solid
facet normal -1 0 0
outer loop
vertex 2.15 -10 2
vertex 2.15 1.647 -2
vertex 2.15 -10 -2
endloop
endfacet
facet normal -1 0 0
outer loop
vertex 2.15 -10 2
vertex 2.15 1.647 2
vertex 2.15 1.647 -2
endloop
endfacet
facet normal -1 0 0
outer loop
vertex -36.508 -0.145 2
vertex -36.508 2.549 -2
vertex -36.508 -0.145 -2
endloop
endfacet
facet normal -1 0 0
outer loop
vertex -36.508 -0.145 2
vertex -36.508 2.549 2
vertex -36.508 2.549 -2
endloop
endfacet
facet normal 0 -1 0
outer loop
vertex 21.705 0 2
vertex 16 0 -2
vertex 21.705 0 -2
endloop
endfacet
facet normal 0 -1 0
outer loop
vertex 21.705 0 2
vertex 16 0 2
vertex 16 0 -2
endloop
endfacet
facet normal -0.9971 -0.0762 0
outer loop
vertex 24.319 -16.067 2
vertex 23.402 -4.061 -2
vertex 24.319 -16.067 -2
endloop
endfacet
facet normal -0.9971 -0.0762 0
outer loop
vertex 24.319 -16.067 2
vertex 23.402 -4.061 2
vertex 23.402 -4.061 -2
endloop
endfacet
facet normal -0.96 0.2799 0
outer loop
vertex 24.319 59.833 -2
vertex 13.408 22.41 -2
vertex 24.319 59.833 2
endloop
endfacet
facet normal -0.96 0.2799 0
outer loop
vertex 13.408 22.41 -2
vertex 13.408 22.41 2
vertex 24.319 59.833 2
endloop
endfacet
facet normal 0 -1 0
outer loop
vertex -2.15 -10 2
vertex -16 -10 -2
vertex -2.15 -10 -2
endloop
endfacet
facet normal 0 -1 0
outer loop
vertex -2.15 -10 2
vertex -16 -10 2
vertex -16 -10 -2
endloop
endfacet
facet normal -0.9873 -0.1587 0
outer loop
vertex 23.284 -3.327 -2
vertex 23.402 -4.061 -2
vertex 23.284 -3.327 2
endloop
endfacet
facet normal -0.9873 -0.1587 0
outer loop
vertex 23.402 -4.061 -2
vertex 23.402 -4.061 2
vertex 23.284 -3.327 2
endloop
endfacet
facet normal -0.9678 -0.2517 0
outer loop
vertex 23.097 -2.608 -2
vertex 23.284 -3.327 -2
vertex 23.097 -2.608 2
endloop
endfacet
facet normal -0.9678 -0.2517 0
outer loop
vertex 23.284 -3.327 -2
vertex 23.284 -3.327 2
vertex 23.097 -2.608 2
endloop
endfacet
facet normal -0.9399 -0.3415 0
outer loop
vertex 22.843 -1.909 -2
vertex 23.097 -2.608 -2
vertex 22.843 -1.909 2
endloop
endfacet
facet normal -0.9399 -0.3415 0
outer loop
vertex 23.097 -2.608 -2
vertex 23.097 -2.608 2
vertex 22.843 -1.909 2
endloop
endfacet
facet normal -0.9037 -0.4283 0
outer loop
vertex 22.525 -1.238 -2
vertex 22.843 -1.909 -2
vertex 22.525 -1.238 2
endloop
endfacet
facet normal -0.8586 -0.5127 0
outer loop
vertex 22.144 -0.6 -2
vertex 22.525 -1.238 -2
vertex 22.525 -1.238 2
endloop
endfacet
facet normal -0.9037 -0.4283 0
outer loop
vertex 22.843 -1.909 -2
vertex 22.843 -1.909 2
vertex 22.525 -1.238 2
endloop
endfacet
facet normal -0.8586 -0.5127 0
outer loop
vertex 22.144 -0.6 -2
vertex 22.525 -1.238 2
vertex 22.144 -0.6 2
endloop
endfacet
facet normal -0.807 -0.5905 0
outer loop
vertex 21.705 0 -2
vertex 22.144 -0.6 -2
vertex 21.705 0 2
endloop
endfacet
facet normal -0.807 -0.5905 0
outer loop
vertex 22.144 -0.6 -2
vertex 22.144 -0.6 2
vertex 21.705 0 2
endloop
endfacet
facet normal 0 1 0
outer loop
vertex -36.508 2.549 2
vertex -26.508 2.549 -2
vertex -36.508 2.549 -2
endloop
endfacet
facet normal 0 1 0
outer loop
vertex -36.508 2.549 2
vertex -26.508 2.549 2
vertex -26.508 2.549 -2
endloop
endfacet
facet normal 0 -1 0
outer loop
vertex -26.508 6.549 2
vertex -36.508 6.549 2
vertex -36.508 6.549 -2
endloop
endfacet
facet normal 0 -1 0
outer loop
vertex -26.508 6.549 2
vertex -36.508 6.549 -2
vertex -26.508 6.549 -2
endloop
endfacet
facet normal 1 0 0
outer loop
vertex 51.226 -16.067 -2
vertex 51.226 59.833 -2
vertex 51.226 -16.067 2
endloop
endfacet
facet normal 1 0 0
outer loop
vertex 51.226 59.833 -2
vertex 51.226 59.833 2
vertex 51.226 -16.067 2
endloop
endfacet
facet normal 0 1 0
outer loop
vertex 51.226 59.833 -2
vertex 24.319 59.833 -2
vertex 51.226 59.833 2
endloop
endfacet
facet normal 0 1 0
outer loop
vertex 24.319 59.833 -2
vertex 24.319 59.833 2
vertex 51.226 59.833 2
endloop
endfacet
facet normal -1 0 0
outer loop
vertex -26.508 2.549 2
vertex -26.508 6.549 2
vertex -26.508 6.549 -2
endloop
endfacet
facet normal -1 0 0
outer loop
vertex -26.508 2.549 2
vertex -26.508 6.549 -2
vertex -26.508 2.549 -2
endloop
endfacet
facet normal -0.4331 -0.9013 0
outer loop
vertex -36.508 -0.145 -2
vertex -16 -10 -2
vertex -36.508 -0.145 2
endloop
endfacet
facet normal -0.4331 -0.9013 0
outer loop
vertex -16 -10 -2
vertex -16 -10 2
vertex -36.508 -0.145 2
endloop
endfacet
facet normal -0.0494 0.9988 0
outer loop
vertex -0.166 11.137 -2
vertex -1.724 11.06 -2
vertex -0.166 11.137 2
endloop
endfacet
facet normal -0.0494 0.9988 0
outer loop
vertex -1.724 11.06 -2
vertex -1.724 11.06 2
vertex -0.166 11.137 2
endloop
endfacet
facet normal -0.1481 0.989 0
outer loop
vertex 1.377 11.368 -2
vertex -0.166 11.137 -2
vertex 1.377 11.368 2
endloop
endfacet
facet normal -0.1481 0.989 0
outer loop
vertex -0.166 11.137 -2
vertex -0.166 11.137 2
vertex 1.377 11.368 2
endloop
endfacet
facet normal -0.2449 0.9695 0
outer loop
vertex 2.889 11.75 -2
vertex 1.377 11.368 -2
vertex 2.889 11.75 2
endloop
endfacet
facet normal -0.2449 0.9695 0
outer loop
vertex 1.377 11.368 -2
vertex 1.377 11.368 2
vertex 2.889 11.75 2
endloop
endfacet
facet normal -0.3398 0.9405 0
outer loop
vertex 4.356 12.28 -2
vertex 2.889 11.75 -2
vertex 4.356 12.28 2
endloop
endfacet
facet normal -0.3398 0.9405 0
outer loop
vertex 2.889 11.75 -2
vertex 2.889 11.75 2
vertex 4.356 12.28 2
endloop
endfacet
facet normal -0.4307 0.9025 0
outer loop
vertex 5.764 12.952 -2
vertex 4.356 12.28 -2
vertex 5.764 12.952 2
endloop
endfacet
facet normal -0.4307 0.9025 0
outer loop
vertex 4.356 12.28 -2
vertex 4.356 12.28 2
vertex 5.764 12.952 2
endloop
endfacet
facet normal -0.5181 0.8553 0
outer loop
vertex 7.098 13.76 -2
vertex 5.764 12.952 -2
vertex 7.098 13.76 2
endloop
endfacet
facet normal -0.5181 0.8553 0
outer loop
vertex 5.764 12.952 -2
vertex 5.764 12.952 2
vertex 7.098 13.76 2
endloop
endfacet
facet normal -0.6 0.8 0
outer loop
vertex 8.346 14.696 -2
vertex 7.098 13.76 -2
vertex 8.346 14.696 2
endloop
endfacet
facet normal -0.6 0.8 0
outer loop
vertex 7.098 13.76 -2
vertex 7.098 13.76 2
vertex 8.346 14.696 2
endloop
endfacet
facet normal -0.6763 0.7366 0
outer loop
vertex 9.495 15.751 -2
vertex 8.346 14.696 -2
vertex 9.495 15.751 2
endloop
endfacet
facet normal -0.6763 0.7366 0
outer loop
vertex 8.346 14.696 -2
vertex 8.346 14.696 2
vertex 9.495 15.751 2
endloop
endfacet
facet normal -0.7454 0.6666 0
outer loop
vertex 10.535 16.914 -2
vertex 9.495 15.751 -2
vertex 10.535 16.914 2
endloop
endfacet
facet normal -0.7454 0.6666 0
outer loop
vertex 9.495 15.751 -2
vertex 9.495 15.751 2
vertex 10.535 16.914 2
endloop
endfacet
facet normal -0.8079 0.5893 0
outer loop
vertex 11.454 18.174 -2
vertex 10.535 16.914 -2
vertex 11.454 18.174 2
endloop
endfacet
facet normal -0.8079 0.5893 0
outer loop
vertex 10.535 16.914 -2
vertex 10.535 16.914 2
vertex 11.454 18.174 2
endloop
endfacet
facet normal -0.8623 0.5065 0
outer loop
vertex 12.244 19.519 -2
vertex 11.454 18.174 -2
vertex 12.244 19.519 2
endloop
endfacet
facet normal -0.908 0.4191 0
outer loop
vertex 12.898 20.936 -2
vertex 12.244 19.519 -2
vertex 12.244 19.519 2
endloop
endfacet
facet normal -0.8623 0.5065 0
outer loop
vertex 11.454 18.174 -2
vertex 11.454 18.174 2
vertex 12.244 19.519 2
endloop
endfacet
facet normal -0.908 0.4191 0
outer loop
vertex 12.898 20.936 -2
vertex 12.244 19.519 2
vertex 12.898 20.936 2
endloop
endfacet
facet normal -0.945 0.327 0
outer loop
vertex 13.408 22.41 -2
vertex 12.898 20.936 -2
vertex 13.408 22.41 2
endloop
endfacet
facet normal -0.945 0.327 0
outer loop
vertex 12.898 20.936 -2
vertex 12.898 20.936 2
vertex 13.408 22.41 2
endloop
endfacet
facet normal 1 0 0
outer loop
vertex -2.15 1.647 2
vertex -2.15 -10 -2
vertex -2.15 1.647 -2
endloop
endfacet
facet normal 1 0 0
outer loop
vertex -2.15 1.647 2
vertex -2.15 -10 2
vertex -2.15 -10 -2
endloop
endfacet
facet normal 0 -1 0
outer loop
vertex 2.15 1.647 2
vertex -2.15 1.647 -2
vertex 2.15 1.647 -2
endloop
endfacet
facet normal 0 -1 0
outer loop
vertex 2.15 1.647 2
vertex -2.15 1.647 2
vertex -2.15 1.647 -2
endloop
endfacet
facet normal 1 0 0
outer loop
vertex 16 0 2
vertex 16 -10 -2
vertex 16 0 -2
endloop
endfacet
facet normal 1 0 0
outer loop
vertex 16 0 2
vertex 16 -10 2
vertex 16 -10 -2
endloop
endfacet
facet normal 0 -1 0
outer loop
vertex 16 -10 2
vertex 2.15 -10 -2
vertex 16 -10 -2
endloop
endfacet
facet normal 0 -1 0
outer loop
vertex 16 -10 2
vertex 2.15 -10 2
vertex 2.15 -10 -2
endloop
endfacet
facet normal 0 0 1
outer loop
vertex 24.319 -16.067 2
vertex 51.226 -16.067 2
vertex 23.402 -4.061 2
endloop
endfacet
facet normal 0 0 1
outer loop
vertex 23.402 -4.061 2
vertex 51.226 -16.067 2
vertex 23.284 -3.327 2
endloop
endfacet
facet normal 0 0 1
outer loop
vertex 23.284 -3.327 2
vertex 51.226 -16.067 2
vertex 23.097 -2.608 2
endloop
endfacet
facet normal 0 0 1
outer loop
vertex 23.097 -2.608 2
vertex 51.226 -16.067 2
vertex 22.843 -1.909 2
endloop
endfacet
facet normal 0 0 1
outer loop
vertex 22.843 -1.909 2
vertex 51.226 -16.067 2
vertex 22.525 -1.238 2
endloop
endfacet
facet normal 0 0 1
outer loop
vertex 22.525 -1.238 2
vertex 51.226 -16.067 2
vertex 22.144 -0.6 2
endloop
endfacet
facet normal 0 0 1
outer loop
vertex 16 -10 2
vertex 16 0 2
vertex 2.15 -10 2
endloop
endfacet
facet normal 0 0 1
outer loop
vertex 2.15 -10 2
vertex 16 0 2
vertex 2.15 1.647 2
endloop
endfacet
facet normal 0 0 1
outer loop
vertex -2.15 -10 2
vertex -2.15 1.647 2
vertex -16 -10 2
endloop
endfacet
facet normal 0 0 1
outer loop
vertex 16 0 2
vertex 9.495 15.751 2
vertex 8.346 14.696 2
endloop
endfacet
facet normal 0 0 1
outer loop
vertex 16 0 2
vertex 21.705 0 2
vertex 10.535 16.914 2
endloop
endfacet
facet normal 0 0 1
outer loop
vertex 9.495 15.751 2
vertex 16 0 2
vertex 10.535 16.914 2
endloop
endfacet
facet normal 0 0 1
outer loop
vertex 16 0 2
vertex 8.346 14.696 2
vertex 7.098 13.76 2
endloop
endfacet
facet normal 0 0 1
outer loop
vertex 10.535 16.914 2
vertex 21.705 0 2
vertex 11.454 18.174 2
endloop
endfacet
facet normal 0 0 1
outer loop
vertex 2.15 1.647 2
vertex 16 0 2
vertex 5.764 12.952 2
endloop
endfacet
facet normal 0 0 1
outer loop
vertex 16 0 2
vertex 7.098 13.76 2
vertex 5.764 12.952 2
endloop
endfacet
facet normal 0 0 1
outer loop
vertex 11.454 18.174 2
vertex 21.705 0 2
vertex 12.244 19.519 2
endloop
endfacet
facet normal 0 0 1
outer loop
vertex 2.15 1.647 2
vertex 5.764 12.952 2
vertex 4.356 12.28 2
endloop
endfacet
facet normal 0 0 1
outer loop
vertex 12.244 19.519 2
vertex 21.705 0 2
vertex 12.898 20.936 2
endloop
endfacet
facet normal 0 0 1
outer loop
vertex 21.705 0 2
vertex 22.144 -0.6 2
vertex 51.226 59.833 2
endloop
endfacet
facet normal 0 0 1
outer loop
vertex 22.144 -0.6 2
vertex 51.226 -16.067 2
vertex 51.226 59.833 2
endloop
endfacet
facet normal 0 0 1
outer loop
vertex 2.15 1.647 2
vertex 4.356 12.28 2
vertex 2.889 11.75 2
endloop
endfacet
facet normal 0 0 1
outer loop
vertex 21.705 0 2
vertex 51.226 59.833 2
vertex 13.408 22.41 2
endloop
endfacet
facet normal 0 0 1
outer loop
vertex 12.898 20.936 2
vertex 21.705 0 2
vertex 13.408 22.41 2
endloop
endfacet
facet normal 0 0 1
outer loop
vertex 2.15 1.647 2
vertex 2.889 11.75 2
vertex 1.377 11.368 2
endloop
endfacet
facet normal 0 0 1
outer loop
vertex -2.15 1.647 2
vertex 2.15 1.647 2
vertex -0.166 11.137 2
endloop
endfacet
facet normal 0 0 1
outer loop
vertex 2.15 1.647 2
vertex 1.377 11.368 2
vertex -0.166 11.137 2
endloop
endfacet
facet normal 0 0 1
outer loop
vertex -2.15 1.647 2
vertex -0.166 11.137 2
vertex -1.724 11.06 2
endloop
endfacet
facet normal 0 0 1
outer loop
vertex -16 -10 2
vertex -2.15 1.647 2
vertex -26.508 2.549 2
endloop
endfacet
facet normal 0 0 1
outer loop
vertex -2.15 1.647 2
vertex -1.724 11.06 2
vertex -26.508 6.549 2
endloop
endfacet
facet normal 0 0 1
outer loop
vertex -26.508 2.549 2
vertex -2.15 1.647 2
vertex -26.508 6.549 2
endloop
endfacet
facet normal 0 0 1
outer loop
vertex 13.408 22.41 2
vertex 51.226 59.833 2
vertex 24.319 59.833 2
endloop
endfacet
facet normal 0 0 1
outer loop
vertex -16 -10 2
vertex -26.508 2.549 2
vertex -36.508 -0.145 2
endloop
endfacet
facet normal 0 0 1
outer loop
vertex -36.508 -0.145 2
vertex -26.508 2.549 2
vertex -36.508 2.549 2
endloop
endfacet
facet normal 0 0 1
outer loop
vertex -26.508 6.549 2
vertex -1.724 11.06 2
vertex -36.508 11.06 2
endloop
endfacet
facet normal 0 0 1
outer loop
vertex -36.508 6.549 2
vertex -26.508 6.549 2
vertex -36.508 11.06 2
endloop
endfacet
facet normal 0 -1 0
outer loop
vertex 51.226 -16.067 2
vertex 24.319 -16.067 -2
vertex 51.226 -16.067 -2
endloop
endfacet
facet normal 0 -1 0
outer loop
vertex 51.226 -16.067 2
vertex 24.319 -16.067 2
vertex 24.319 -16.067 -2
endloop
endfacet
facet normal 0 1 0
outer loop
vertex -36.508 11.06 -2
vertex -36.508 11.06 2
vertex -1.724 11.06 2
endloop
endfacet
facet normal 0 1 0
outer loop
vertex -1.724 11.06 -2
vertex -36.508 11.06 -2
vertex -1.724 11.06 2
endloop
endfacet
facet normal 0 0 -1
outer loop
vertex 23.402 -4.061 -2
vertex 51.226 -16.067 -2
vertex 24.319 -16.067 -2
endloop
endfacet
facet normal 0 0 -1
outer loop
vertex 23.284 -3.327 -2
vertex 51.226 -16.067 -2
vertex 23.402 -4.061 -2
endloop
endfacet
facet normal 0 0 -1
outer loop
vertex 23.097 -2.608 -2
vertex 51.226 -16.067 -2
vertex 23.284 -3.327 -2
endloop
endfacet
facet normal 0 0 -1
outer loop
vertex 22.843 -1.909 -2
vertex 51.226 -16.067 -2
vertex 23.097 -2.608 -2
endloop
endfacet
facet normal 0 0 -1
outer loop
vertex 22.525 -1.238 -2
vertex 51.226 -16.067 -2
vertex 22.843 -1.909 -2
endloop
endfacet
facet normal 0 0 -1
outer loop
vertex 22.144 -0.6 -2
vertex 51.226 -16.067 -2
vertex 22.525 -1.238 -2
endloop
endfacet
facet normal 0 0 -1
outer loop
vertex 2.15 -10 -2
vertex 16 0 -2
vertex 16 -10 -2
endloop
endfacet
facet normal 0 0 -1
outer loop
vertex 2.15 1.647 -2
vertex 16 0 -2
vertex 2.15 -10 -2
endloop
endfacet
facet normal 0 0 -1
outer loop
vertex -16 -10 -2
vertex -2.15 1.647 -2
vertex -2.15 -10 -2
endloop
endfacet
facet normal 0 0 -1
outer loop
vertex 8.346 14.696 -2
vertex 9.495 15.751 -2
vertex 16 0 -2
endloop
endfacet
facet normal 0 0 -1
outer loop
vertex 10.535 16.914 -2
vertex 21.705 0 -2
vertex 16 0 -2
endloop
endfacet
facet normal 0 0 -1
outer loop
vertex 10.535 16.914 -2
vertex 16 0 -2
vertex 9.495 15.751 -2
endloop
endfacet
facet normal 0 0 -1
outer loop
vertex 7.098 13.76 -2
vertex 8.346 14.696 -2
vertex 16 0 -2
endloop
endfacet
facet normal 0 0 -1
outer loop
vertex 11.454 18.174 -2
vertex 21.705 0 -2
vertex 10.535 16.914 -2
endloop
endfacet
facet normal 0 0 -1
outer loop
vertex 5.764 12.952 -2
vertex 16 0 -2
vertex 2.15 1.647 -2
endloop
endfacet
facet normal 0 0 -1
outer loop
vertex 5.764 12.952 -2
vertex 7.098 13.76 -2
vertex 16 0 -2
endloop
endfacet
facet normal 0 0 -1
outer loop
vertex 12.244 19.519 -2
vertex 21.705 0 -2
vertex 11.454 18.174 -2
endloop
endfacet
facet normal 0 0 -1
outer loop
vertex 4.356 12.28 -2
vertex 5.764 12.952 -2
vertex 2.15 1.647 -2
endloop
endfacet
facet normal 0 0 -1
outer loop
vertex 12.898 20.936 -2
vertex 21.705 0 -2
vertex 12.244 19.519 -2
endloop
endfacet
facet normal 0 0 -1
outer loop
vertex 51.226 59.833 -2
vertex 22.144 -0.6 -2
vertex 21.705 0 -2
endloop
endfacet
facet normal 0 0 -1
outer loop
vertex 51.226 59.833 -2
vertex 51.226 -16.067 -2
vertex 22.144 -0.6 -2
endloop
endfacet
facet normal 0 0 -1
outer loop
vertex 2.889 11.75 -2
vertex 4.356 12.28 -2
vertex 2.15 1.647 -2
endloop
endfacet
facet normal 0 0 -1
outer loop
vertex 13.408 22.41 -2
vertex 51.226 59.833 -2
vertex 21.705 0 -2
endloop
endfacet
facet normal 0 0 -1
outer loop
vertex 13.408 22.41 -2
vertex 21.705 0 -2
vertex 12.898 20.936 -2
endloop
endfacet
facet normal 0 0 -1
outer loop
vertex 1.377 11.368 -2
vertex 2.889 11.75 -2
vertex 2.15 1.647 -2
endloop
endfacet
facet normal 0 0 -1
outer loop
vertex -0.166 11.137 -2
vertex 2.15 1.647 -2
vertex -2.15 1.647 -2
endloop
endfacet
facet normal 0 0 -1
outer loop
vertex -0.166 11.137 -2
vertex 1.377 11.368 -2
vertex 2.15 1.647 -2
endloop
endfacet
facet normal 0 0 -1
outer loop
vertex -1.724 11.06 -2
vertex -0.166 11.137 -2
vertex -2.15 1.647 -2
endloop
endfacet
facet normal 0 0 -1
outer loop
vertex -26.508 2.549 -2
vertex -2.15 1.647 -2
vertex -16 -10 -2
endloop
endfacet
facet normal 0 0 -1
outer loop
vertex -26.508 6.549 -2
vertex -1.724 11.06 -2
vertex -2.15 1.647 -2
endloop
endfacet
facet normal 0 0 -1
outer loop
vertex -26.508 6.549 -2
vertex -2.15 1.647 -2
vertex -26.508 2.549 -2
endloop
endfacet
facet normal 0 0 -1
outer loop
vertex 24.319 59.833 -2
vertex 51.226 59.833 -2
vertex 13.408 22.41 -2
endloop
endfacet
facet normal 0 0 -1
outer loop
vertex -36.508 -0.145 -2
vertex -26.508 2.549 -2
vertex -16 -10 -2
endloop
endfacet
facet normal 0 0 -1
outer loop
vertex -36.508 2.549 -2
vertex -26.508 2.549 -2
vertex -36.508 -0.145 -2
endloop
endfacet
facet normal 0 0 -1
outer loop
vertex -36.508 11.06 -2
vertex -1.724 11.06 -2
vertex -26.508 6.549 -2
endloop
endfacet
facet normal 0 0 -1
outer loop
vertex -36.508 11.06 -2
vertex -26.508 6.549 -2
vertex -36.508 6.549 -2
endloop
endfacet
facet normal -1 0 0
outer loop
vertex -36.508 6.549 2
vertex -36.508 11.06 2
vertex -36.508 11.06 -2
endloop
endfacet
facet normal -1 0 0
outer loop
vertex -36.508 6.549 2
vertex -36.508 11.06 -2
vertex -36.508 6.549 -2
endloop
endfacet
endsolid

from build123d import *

# Parameters (mm, degrees)
PAD_DEPTH = 2


with BuildPart() as part:
    # CopySketch004 → Pad (new body, symmetric)
    with BuildSketch(Plane.XY):
        with BuildLine():
            Line((-36.508492, 11.060009), (-1.723702, 11.060009))
            ThreePointArc((-1.723702, 11.060009), (7.733856, 14.212769), (13.407871, 22.409771))
            Line((13.407871, 22.409771), (24.319128, 59.832547))
            Line((24.319128, 59.832547), (51.226102, 59.832547))
            Line((51.226102, 59.832547), (51.226102, -16.067453))
            Line((24.319128, -16.067453), (51.226102, -16.067453))
            Line((23.401691, -4.060687), (24.319128, -16.067453))
            ThreePointArc((23.401691, -4.060687), (22.843077, -1.909417), (21.705474, 0))
            Line((16, 0), (21.705474, 0))
            Line((16, -10), (16, 0))
            Line((2.15, -10), (16, -10))
            Line((2.15, 1.647389), (2.15, -10))
            Line((-2.15, 1.647389), (2.15, 1.647389))
            Line((-2.15, -10), (-2.15, 1.647389))
            Line((-16, -10), (-2.15, -10))
            Line((-16, -10), (-36.508492, -0.144815))
            Line((-36.508492, 2.549264), (-36.508492, -0.144815))
            Line((-26.508492, 2.549264), (-36.508492, 2.549264))
            Line((-26.508492, 6.549264), (-26.508492, 2.549264))
            Line((-36.508492, 6.549264), (-26.508492, 6.549264))
            Line((-36.508492, 11.060009), (-36.508492, 6.549264))
        make_face()
    extrude(amount=PAD_DEPTH, both=True)


solid = part.part
